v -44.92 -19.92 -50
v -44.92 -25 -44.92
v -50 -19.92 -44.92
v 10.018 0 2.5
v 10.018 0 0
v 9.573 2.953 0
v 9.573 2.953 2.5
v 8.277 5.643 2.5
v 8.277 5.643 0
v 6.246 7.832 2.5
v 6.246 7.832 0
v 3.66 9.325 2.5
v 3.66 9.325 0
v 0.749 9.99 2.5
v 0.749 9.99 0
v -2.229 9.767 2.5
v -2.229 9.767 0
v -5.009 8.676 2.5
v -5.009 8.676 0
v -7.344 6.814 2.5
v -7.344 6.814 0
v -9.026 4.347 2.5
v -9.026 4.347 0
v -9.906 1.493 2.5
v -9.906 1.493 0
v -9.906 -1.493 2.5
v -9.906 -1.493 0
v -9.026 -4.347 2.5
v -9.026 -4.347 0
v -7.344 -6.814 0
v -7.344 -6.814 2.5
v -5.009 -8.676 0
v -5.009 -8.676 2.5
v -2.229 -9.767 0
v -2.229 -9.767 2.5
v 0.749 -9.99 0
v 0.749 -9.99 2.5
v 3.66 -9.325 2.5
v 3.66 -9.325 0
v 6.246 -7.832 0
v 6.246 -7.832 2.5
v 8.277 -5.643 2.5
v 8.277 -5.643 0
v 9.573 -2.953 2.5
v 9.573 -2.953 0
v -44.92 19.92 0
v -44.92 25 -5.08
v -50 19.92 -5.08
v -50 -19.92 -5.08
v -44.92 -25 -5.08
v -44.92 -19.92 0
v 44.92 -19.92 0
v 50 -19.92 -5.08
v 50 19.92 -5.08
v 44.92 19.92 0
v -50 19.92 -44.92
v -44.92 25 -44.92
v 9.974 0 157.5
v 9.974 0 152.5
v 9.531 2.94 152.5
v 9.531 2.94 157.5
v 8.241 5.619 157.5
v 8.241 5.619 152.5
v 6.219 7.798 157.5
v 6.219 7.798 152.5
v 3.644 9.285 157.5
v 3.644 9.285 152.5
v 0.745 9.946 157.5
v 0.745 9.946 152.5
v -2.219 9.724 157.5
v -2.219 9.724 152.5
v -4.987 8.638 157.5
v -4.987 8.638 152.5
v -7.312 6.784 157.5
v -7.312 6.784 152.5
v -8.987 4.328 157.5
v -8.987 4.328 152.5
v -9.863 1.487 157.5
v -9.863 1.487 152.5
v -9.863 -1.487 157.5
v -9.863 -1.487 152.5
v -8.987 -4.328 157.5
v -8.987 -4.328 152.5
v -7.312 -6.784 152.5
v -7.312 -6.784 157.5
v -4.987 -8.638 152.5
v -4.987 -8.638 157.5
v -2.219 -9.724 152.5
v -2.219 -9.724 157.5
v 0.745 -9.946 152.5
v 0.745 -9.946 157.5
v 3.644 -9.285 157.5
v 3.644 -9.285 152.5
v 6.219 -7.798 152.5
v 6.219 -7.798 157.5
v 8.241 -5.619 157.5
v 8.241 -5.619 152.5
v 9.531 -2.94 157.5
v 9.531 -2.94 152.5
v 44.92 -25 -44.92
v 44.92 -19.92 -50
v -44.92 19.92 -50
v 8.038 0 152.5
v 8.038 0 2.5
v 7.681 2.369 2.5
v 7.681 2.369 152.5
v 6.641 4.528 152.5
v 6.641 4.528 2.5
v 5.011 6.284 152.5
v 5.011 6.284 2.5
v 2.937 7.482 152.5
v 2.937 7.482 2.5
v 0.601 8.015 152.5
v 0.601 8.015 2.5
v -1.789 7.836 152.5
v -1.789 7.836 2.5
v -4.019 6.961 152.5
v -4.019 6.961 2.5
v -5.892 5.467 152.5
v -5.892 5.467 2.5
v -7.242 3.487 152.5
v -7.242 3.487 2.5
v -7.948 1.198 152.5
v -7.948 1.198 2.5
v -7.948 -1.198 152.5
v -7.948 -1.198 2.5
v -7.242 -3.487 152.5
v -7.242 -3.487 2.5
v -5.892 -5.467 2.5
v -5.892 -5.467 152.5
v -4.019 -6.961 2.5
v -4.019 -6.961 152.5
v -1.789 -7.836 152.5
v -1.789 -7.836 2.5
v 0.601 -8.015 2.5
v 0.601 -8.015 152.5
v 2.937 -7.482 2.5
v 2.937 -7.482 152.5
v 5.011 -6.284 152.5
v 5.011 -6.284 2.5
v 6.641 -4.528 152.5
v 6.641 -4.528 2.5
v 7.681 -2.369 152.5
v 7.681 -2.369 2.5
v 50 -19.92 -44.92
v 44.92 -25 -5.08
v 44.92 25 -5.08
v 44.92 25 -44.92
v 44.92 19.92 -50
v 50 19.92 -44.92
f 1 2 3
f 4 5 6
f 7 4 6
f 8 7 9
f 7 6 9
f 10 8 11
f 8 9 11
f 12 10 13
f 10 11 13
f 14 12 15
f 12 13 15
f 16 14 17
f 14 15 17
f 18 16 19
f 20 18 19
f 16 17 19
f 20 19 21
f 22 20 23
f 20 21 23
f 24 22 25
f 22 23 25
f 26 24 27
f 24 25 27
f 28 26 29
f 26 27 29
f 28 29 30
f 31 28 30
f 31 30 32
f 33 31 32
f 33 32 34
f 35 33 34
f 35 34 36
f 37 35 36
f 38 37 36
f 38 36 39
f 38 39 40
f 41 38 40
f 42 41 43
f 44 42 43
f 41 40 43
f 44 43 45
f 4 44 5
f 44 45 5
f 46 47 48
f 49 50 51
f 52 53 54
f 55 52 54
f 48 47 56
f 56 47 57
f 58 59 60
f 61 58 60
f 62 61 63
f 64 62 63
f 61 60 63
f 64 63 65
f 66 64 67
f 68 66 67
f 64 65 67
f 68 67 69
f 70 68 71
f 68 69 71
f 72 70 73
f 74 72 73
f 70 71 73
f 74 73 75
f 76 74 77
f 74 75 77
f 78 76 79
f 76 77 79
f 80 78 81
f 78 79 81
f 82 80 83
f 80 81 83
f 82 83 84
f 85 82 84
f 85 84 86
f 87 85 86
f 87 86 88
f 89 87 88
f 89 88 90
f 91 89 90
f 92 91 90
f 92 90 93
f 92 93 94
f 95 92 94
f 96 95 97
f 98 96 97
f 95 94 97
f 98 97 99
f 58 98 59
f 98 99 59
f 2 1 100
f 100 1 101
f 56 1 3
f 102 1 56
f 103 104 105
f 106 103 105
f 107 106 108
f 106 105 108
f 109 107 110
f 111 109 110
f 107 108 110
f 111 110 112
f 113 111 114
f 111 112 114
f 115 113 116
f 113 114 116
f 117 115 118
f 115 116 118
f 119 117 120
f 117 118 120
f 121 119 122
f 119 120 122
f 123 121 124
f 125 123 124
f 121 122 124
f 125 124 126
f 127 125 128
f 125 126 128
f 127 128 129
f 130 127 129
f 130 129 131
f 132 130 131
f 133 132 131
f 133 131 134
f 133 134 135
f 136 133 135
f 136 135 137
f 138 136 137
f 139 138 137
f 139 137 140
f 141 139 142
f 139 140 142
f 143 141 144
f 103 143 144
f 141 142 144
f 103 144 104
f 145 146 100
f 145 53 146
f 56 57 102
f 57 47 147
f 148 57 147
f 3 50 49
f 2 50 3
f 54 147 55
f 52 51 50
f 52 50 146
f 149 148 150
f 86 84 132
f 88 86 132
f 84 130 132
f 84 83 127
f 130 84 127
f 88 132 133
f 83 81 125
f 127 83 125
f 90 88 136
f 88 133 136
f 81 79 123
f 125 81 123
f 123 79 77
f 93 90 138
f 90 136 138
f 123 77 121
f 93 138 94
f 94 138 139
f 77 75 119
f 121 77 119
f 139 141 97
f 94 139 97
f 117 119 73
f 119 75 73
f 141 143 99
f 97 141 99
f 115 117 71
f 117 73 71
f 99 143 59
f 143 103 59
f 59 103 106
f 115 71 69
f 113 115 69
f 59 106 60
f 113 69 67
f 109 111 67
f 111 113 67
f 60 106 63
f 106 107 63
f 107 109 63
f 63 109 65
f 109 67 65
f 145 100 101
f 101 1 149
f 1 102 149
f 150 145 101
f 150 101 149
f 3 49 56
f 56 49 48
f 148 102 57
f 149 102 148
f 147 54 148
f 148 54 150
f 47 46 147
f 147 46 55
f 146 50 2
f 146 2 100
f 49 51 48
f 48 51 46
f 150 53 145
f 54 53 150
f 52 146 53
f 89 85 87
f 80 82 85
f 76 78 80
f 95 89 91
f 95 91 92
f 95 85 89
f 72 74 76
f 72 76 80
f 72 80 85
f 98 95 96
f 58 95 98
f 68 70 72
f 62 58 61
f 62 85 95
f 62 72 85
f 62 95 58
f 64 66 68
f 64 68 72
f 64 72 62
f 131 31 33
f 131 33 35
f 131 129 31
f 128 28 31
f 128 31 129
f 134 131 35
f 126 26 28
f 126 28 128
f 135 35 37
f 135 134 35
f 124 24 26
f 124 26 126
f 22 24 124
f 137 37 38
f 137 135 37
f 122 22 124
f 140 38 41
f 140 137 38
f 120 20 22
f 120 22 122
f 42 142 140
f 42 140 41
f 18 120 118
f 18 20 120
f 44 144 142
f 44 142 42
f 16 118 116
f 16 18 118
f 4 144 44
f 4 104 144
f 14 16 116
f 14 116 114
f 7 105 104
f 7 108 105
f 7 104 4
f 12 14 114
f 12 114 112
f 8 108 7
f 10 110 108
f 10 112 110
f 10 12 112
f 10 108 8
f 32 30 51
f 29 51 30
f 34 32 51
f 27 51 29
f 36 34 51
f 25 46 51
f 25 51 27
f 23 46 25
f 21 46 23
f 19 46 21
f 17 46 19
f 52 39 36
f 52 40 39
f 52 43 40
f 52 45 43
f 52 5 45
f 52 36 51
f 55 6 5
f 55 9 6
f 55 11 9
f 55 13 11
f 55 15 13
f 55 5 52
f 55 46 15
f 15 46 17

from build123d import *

# Parameters (mm, degrees)
F0_R     = 10.017948
F1_DEPTH = 2.5
F2_R     = 8.037712
F3_DEPTH = 150
F4_R     = 9.974269
F6_DEPTH = 5
F5_W     = 100
F5_H     = 50
F7_DEPTH = 50
F8_SIZE  = 5.08


with BuildPart() as f1:
    # F0 (on Top) → F1 (new body)
    with BuildSketch(Plane.XY):
        Circle(F0_R)
    extrude(amount=F1_DEPTH)

    # F2 (on face) → F3 (join)
    with BuildSketch(Plane.XY.offset(2.5)):
        Circle(F2_R)
    extrude(amount=F3_DEPTH)

    # F4 (on face) → F6 (join)
    with BuildSketch(Plane.XY.offset(152.5)):
        Circle(F4_R)
    extrude(amount=F6_DEPTH)

    # F5 (on Top) → F7 (join)
    with BuildSketch(Plane.XY):
        Rectangle(F5_W, F5_H)
    extrude(amount=-F7_DEPTH)

    # F8
    f8_edges = [f1.edges().sort_by_distance(p)[0] for p in [
        (-50, -25, -25),
        (50, -25, -25),
        (0, -25, 0),
        (0, -25, -50),
        (50, 25, -25),
        (-50, 25, -25),
        (0, 25, 0),
        (0, 25, -50),
        (-50, 0, -50),
        (50, 0, -50),
        (50, 0, 0),
        (-50, 0, 0),
    ]]
    chamfer(f8_edges, length=F8_SIZE)


solid = f1.part
